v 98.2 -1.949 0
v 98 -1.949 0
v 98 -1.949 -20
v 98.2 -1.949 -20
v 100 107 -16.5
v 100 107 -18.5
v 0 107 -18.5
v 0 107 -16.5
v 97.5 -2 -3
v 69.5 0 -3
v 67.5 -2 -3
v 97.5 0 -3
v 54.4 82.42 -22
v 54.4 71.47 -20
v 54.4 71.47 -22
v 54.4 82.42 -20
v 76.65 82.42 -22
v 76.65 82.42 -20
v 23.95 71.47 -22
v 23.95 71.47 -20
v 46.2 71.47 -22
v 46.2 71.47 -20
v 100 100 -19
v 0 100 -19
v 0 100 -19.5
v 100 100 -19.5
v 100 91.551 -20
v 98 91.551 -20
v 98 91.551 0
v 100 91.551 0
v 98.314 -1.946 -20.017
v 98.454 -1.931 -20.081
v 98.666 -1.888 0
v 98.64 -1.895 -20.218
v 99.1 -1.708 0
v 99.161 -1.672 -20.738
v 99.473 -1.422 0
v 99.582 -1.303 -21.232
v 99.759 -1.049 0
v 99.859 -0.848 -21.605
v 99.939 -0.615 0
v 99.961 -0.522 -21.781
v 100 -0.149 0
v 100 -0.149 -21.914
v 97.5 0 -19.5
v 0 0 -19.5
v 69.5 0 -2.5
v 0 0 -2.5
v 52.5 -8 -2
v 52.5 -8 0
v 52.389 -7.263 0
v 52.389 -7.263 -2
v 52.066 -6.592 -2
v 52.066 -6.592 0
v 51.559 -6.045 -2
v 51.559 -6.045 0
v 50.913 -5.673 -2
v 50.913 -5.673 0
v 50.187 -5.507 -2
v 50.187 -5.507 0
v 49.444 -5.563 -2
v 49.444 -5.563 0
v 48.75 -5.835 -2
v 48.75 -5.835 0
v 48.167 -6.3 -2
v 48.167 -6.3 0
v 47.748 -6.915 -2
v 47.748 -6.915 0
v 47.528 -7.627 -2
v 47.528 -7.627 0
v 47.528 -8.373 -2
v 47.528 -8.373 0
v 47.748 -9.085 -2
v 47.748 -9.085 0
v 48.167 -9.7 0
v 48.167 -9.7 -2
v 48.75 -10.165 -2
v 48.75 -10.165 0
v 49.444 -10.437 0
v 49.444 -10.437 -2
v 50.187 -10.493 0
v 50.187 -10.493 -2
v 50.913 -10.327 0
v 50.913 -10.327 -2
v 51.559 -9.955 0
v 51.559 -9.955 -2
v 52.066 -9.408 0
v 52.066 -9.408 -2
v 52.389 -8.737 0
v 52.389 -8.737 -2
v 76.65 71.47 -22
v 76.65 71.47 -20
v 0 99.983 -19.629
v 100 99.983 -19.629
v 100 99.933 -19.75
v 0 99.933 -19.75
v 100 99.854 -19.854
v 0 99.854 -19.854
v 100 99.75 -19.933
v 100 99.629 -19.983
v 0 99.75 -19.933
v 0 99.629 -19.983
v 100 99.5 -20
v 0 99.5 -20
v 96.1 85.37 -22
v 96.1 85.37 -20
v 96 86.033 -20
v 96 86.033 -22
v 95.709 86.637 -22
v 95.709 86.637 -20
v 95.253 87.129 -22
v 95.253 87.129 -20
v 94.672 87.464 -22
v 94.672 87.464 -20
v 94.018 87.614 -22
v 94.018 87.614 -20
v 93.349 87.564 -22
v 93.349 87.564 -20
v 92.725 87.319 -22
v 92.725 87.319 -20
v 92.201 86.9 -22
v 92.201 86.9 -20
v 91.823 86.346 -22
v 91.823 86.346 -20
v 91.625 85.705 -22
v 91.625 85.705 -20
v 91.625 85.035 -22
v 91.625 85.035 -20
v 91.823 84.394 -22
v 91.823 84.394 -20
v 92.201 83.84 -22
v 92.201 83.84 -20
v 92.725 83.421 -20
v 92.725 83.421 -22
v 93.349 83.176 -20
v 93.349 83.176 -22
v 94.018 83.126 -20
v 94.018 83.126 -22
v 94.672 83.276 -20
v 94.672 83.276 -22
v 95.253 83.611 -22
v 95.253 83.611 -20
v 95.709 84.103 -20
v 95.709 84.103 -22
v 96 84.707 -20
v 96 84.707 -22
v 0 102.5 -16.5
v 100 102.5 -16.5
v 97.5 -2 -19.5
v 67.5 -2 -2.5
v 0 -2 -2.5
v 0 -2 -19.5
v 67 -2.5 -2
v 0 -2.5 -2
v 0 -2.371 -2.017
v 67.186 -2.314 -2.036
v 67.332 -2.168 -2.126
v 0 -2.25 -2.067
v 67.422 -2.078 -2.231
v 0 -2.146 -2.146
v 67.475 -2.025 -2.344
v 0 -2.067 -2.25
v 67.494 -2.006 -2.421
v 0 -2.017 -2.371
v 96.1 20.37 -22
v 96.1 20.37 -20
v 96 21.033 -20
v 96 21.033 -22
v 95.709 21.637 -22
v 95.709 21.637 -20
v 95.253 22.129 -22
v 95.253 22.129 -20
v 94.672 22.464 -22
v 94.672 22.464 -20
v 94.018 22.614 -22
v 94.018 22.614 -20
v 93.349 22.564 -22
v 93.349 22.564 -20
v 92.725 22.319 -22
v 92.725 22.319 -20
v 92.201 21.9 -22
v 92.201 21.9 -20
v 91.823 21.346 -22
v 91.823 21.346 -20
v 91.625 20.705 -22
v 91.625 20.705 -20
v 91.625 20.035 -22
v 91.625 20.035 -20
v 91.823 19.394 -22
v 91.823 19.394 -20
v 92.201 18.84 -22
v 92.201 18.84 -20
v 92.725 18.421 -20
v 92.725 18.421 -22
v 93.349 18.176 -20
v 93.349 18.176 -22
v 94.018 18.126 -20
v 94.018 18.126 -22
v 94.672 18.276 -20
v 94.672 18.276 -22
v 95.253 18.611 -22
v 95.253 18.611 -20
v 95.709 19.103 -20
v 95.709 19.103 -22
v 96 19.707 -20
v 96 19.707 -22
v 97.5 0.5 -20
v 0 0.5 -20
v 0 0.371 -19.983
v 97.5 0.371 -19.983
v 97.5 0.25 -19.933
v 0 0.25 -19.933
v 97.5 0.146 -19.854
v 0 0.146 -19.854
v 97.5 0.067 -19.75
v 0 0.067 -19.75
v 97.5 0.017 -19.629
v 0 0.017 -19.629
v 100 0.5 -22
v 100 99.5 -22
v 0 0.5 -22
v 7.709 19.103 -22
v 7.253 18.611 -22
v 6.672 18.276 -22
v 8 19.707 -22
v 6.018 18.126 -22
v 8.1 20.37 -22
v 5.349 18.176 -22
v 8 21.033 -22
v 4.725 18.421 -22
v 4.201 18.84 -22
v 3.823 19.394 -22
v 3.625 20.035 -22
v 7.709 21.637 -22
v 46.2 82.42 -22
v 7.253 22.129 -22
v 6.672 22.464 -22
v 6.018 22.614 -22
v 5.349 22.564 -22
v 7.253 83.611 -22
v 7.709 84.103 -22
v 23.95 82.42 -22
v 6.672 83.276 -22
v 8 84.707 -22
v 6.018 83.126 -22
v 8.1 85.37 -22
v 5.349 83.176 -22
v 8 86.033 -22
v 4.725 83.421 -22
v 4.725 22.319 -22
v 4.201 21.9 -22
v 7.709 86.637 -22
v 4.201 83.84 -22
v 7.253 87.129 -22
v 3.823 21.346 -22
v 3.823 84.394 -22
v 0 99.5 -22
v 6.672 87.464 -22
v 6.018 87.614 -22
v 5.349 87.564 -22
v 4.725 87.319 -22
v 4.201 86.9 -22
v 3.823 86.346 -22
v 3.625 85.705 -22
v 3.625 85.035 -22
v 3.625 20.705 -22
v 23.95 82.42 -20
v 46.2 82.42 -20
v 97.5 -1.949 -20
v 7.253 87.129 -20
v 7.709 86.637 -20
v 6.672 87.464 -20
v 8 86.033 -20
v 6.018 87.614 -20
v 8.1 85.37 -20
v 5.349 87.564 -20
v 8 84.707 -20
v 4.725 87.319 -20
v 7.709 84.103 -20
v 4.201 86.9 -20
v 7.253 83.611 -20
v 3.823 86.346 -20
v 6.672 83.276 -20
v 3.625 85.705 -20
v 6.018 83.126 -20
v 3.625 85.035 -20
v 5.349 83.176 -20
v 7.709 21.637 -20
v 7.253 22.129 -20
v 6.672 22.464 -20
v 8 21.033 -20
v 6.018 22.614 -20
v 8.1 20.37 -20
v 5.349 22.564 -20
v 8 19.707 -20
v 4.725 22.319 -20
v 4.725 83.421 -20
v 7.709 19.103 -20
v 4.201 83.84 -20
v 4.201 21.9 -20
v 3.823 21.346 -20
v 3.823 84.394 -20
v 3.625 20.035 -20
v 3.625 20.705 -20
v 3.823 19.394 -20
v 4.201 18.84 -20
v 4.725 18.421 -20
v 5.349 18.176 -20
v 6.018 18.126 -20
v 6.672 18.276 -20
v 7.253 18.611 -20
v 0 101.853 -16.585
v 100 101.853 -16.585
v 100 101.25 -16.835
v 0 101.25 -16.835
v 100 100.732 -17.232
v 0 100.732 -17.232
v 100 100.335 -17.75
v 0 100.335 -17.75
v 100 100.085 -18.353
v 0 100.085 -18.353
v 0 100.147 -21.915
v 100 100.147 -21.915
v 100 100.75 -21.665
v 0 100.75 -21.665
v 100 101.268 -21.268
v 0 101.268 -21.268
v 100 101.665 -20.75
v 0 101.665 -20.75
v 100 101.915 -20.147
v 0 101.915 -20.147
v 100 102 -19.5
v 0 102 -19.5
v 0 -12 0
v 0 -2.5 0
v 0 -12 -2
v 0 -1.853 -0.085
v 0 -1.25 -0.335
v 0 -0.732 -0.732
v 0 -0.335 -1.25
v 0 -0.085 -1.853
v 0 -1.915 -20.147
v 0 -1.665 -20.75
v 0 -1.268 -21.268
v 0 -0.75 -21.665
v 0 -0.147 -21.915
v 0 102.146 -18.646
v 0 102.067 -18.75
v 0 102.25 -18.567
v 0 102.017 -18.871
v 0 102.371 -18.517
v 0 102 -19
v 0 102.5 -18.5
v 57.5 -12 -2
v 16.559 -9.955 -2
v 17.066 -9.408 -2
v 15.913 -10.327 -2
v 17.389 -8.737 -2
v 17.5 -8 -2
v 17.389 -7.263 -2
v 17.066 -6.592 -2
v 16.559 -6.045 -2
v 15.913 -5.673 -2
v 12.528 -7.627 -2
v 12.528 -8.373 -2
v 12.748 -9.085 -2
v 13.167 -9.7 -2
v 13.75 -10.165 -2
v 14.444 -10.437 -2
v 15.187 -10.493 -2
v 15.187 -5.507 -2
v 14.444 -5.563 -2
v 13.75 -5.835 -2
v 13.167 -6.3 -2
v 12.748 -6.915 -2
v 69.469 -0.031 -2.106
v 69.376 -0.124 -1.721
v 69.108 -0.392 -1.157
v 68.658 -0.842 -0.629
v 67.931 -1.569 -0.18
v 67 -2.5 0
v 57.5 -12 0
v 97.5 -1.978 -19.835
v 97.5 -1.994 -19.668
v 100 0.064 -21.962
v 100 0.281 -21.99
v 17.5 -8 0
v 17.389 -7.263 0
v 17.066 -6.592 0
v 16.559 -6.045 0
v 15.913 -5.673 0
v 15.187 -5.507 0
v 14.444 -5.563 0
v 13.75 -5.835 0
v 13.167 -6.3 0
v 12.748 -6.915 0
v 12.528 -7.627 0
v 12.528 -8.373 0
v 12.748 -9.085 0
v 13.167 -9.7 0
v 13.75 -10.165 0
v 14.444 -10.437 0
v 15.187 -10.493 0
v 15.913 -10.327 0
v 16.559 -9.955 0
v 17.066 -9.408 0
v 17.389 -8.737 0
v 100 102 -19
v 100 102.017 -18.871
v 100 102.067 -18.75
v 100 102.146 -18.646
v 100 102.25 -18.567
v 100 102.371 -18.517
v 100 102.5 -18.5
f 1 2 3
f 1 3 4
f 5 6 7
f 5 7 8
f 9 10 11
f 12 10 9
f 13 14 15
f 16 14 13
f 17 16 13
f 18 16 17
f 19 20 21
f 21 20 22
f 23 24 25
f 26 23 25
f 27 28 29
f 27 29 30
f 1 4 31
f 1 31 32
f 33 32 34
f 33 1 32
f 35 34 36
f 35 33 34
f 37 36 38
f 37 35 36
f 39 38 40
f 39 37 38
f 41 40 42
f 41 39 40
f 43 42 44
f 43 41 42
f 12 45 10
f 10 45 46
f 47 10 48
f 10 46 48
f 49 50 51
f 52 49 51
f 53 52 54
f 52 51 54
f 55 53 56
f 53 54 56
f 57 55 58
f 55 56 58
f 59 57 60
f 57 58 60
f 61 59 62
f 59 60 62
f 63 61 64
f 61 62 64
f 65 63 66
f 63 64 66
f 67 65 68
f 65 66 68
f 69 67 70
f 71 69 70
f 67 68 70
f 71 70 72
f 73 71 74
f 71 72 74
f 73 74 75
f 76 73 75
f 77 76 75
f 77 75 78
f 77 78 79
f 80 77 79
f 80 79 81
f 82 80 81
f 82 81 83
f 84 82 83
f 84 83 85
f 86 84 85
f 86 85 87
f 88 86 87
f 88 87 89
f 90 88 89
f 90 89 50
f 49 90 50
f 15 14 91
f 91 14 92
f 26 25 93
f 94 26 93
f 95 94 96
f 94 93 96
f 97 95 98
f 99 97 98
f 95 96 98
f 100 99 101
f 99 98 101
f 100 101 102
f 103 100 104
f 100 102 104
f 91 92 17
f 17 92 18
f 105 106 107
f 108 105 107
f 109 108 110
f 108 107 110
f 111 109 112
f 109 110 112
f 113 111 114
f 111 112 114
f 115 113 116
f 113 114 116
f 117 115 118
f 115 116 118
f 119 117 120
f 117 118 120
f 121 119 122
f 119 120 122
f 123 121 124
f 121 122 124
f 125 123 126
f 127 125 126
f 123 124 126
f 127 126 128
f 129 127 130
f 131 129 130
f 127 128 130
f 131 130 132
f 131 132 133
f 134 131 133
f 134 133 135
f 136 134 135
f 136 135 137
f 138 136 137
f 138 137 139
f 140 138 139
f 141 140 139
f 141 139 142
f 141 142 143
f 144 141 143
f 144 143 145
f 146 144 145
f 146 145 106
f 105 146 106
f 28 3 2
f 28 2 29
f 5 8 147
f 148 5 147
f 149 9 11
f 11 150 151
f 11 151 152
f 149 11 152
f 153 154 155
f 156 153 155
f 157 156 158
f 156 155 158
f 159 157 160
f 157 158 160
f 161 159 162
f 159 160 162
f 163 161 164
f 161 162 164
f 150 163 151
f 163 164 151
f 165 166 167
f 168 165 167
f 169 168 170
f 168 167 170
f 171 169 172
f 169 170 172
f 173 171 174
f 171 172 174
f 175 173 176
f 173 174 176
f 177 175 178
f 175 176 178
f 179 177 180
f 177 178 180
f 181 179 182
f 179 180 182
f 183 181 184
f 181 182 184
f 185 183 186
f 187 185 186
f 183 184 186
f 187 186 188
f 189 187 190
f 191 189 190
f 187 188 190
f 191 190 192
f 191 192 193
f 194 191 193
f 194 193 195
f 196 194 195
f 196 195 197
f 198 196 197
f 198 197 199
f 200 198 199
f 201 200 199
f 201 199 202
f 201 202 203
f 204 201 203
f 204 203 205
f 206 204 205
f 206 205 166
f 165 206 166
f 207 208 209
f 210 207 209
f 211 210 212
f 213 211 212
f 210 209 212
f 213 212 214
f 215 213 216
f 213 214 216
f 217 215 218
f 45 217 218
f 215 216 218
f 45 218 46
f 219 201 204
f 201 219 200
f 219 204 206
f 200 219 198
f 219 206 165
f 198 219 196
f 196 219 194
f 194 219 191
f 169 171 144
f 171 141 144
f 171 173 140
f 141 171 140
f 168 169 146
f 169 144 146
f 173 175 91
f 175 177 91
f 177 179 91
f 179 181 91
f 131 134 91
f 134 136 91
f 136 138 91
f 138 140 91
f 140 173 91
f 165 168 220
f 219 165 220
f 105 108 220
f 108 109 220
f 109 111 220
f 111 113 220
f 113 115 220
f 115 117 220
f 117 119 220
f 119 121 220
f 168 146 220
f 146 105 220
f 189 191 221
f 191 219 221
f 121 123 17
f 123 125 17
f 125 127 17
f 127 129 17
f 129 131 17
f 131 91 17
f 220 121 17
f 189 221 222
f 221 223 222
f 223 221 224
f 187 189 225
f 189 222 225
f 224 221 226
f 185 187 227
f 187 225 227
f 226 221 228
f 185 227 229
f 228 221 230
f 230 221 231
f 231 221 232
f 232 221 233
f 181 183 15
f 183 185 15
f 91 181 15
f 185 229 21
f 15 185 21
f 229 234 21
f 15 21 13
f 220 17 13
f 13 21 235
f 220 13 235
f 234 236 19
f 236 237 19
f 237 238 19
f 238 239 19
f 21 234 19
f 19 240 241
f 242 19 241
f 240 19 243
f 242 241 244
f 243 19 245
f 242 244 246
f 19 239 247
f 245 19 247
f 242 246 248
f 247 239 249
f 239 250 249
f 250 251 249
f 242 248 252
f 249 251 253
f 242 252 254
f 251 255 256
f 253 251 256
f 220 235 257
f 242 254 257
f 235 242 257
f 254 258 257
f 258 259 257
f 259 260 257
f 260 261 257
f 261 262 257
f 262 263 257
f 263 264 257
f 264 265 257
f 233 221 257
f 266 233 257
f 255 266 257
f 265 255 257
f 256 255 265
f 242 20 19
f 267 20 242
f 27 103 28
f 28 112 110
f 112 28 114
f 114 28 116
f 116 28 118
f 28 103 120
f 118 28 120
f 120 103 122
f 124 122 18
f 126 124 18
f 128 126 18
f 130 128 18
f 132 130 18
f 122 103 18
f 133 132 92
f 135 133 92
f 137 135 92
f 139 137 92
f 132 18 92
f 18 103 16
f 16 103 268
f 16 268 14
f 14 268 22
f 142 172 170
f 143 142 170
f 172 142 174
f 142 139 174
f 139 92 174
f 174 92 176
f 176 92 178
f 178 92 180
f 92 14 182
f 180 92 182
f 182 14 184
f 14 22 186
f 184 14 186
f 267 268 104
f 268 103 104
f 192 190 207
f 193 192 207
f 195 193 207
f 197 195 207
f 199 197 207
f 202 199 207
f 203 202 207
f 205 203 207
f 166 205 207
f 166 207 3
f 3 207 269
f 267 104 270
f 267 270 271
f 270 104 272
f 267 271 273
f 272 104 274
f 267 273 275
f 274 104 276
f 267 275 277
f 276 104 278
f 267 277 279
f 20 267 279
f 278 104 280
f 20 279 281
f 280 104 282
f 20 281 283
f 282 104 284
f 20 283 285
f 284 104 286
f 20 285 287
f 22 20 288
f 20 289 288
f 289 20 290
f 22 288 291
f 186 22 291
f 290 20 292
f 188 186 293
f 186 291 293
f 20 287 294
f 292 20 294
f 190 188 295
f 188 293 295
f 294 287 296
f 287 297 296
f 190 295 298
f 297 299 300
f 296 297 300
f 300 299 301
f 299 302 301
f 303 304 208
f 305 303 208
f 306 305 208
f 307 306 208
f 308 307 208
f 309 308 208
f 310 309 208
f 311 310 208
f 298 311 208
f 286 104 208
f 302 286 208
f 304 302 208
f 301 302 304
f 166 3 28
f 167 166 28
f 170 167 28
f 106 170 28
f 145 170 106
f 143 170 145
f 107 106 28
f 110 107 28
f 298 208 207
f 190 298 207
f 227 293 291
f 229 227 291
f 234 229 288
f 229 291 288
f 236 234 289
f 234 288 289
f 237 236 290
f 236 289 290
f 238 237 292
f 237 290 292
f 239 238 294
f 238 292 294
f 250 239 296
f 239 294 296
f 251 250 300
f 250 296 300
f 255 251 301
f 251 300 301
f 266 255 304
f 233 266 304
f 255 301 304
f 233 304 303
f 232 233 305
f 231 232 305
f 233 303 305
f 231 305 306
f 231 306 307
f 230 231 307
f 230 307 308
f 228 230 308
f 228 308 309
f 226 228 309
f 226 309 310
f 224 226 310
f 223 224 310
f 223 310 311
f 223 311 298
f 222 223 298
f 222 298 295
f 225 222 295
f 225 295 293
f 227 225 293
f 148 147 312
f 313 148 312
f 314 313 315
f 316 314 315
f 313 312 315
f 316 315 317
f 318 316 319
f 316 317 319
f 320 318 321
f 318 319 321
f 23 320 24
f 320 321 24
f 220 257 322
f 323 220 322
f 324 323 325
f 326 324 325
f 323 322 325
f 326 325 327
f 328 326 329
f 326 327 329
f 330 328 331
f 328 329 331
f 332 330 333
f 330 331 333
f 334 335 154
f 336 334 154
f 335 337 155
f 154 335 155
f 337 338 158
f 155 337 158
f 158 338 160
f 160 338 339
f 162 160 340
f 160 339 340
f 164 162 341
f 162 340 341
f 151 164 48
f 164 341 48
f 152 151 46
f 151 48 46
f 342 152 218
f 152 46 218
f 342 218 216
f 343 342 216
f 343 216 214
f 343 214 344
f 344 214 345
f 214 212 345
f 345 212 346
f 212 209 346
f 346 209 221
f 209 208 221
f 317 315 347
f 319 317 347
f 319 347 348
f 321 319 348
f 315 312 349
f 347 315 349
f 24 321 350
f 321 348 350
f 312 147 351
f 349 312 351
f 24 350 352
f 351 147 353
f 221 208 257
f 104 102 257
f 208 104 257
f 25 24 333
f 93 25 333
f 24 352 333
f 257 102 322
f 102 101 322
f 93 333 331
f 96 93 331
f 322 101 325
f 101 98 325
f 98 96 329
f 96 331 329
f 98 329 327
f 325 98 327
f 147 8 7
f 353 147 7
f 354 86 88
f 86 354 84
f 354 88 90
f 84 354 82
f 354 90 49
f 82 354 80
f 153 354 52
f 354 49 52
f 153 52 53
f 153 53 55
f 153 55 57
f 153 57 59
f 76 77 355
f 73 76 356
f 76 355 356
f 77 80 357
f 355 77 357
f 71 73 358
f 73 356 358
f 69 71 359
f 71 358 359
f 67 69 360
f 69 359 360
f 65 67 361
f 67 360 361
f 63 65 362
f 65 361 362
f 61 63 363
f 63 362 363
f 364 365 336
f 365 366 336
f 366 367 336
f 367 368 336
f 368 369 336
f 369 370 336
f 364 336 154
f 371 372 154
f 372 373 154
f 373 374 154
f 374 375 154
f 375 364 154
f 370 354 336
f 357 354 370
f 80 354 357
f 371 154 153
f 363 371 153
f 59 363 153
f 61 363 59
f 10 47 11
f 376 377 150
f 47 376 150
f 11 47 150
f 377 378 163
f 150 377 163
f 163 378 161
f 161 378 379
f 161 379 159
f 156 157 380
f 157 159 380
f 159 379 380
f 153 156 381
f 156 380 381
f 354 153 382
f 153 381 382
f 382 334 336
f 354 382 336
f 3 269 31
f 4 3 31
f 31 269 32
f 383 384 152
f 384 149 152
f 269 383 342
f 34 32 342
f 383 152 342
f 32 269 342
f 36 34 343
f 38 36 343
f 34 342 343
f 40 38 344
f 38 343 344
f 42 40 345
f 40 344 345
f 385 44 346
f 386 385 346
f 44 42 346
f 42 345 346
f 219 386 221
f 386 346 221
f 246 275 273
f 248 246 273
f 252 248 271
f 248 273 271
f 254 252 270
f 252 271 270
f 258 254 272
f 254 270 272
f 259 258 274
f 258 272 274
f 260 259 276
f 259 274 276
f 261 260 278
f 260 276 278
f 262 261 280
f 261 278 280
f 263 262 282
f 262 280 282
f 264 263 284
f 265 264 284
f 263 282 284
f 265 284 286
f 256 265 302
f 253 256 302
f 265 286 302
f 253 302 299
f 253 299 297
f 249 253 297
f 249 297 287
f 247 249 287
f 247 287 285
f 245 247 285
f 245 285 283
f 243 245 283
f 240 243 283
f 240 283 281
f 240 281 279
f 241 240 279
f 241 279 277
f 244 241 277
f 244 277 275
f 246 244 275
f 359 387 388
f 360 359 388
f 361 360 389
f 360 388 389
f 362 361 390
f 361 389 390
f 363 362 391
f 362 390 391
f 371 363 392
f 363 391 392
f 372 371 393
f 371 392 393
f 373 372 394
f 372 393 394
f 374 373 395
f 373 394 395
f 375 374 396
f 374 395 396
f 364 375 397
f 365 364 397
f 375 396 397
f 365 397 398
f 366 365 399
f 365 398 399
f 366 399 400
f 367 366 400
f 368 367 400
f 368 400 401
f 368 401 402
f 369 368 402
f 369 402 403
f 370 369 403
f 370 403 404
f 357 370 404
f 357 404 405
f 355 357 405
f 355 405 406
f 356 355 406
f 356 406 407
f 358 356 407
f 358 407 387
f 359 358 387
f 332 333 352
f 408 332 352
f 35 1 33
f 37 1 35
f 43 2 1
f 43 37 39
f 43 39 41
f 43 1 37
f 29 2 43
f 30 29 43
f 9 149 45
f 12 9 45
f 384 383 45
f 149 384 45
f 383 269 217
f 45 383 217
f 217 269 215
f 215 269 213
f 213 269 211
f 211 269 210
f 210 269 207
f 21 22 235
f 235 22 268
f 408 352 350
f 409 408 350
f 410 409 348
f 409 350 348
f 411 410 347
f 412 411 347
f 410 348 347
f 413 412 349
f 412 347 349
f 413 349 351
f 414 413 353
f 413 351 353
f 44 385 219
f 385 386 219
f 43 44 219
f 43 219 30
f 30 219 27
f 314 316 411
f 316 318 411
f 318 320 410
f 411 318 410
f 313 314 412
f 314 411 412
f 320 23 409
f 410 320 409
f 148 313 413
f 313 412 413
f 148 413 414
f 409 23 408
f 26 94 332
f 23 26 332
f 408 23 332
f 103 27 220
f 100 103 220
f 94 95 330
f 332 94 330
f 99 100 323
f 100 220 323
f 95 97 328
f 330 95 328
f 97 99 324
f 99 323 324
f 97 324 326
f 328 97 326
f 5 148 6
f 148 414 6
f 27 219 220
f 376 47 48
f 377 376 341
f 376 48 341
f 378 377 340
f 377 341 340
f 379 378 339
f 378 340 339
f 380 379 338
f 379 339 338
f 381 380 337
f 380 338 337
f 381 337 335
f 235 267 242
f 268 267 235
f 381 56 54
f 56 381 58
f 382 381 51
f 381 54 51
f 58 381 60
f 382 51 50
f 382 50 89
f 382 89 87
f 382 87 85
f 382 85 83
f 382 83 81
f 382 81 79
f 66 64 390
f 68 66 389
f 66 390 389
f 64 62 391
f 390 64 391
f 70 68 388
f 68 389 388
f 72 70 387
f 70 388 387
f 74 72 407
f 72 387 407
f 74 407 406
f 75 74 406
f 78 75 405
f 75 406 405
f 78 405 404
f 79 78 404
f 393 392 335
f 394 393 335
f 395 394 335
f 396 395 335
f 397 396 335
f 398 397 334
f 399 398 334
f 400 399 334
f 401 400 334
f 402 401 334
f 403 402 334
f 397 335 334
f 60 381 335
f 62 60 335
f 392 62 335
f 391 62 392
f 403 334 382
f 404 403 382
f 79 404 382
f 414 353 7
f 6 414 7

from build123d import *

# Parameters (mm, degrees)
BOSS_EXTRUDE1_DEPTH = 100
SKETCH2_W           = 2.5
SKETCH2_H           = 12.5
CUT_EXTRUDE1_DEPTH  = 21
SKETCH3_W           = 2
SKETCH3_H           = 93.5
BOSS_EXTRUDE2_DEPTH = 20
SKETCH4_R           = 2.5
CUT_EXTRUDE3_DEPTH  = 3
SKETCH5_R           = 2.25
SKETCH5_W           = 22.25
SKETCH5_H           = 10.95
CUT_EXTRUDE4_DEPTH  = 5
FILLET1_R           = 1.8


with BuildPart() as part:
    # Sketch1 → Boss-Extrude1 (new body)
    with BuildSketch(Plane(origin=(0, 0, 0), x_dir=(0, 0, -1), z_dir=(1, 0, 0))):
        with BuildLine():
            Line((0, -2.5), (0, -12))
            Line((0, -12), (2, -12))
            Line((2, -12), (2, -2.5))
            ThreePointArc((2, -2.5), (2.146446609, -2.146446609), (2.5, -2))
            Line((2.5, -2), (19.5, -2))
            ThreePointArc((19.5, -2), (21.267766953, -1.267766953), (22, 0.5))
            Line((22, 0.5), (22, 99.5))
            ThreePointArc((22, 99.5), (21.267766953, 101.267766953), (19.5, 102))
            Line((19.5, 102), (19, 102))
            ThreePointArc((19, 102), (18.646446609, 102.146446609), (18.5, 102.5))
            Line((18.5, 102.5), (18.5, 107))
            Line((18.5, 107), (16.5, 107))
            Line((16.5, 107), (16.5, 102.5))
            ThreePointArc((16.5, 102.5), (17.232233047, 100.732233047), (19, 100))
            Line((19, 100), (19.5, 100))
            ThreePointArc((19.5, 100), (19.853553391, 99.853553391), (20, 99.5))
            Line((20, 99.5), (20, 0.5))
            ThreePointArc((20, 0.5), (19.853553391, 0.146446609), (19.5, 0))
            Line((19.5, 0), (2.5, 0))
            ThreePointArc((2.5, 0), (0.732233047, -0.732233047), (0, -2.5))
        make_face()
    extrude(amount=BOSS_EXTRUDE1_DEPTH)

    # Sketch2 → Cut-Extrude1 (cut, through all)
    with BuildSketch(Plane.XY.offset(-20)):
        with Locations((98.75, -5.75)):
            Rectangle(SKETCH2_W, SKETCH2_H)
    extrude(amount=CUT_EXTRUDE1_DEPTH, mode=Mode.SUBTRACT)

    # Sketch3 → Boss-Extrude2 (add)
    with BuildSketch(Plane.XY.offset(-20)):
        with Locations((99, 44.800510257)):
            Rectangle(SKETCH3_W, SKETCH3_H)
    extrude(amount=BOSS_EXTRUDE2_DEPTH)

    # Sketch4 → Cut-Extrude3 (cut)
    with BuildSketch(Plane.XY):
        with Locations((15, -8)):
            Circle(SKETCH4_R)
        with Locations((50, -8)):
            Circle(SKETCH4_R)
        Polygon((97.5, 0), (69.5, 0), (57.5, -12), (97.5, -12), align=None)
    extrude(amount=-CUT_EXTRUDE3_DEPTH, mode=Mode.SUBTRACT)

    # Sketch5 → Cut-Extrude4 (cut)
    with BuildSketch(Plane.XY.offset(-20)):
        with Locations((5.85, 85.37)):
            Circle(SKETCH5_R)
        with Locations((5.85, 20.37)):
            Circle(SKETCH5_R)
        with Locations((93.85, 20.37)):
            Circle(SKETCH5_R)
        with Locations((93.85, 85.37)):
            Circle(SKETCH5_R)
        with Locations((35.075, 76.945)):
            Rectangle(SKETCH5_W, SKETCH5_H)
        with Locations((65.525, 76.945)):
            Rectangle(SKETCH5_W, SKETCH5_H)
    extrude(amount=-CUT_EXTRUDE4_DEPTH, mode=Mode.SUBTRACT)

    # Fillet1
    fillet1_edges = [part.edges().sort_by_distance(p)[0] for p in [
        (100, -1.949489743, -10),
    ]]
    fillet(fillet1_edges, radius=FILLET1_R)


solid = part.part
